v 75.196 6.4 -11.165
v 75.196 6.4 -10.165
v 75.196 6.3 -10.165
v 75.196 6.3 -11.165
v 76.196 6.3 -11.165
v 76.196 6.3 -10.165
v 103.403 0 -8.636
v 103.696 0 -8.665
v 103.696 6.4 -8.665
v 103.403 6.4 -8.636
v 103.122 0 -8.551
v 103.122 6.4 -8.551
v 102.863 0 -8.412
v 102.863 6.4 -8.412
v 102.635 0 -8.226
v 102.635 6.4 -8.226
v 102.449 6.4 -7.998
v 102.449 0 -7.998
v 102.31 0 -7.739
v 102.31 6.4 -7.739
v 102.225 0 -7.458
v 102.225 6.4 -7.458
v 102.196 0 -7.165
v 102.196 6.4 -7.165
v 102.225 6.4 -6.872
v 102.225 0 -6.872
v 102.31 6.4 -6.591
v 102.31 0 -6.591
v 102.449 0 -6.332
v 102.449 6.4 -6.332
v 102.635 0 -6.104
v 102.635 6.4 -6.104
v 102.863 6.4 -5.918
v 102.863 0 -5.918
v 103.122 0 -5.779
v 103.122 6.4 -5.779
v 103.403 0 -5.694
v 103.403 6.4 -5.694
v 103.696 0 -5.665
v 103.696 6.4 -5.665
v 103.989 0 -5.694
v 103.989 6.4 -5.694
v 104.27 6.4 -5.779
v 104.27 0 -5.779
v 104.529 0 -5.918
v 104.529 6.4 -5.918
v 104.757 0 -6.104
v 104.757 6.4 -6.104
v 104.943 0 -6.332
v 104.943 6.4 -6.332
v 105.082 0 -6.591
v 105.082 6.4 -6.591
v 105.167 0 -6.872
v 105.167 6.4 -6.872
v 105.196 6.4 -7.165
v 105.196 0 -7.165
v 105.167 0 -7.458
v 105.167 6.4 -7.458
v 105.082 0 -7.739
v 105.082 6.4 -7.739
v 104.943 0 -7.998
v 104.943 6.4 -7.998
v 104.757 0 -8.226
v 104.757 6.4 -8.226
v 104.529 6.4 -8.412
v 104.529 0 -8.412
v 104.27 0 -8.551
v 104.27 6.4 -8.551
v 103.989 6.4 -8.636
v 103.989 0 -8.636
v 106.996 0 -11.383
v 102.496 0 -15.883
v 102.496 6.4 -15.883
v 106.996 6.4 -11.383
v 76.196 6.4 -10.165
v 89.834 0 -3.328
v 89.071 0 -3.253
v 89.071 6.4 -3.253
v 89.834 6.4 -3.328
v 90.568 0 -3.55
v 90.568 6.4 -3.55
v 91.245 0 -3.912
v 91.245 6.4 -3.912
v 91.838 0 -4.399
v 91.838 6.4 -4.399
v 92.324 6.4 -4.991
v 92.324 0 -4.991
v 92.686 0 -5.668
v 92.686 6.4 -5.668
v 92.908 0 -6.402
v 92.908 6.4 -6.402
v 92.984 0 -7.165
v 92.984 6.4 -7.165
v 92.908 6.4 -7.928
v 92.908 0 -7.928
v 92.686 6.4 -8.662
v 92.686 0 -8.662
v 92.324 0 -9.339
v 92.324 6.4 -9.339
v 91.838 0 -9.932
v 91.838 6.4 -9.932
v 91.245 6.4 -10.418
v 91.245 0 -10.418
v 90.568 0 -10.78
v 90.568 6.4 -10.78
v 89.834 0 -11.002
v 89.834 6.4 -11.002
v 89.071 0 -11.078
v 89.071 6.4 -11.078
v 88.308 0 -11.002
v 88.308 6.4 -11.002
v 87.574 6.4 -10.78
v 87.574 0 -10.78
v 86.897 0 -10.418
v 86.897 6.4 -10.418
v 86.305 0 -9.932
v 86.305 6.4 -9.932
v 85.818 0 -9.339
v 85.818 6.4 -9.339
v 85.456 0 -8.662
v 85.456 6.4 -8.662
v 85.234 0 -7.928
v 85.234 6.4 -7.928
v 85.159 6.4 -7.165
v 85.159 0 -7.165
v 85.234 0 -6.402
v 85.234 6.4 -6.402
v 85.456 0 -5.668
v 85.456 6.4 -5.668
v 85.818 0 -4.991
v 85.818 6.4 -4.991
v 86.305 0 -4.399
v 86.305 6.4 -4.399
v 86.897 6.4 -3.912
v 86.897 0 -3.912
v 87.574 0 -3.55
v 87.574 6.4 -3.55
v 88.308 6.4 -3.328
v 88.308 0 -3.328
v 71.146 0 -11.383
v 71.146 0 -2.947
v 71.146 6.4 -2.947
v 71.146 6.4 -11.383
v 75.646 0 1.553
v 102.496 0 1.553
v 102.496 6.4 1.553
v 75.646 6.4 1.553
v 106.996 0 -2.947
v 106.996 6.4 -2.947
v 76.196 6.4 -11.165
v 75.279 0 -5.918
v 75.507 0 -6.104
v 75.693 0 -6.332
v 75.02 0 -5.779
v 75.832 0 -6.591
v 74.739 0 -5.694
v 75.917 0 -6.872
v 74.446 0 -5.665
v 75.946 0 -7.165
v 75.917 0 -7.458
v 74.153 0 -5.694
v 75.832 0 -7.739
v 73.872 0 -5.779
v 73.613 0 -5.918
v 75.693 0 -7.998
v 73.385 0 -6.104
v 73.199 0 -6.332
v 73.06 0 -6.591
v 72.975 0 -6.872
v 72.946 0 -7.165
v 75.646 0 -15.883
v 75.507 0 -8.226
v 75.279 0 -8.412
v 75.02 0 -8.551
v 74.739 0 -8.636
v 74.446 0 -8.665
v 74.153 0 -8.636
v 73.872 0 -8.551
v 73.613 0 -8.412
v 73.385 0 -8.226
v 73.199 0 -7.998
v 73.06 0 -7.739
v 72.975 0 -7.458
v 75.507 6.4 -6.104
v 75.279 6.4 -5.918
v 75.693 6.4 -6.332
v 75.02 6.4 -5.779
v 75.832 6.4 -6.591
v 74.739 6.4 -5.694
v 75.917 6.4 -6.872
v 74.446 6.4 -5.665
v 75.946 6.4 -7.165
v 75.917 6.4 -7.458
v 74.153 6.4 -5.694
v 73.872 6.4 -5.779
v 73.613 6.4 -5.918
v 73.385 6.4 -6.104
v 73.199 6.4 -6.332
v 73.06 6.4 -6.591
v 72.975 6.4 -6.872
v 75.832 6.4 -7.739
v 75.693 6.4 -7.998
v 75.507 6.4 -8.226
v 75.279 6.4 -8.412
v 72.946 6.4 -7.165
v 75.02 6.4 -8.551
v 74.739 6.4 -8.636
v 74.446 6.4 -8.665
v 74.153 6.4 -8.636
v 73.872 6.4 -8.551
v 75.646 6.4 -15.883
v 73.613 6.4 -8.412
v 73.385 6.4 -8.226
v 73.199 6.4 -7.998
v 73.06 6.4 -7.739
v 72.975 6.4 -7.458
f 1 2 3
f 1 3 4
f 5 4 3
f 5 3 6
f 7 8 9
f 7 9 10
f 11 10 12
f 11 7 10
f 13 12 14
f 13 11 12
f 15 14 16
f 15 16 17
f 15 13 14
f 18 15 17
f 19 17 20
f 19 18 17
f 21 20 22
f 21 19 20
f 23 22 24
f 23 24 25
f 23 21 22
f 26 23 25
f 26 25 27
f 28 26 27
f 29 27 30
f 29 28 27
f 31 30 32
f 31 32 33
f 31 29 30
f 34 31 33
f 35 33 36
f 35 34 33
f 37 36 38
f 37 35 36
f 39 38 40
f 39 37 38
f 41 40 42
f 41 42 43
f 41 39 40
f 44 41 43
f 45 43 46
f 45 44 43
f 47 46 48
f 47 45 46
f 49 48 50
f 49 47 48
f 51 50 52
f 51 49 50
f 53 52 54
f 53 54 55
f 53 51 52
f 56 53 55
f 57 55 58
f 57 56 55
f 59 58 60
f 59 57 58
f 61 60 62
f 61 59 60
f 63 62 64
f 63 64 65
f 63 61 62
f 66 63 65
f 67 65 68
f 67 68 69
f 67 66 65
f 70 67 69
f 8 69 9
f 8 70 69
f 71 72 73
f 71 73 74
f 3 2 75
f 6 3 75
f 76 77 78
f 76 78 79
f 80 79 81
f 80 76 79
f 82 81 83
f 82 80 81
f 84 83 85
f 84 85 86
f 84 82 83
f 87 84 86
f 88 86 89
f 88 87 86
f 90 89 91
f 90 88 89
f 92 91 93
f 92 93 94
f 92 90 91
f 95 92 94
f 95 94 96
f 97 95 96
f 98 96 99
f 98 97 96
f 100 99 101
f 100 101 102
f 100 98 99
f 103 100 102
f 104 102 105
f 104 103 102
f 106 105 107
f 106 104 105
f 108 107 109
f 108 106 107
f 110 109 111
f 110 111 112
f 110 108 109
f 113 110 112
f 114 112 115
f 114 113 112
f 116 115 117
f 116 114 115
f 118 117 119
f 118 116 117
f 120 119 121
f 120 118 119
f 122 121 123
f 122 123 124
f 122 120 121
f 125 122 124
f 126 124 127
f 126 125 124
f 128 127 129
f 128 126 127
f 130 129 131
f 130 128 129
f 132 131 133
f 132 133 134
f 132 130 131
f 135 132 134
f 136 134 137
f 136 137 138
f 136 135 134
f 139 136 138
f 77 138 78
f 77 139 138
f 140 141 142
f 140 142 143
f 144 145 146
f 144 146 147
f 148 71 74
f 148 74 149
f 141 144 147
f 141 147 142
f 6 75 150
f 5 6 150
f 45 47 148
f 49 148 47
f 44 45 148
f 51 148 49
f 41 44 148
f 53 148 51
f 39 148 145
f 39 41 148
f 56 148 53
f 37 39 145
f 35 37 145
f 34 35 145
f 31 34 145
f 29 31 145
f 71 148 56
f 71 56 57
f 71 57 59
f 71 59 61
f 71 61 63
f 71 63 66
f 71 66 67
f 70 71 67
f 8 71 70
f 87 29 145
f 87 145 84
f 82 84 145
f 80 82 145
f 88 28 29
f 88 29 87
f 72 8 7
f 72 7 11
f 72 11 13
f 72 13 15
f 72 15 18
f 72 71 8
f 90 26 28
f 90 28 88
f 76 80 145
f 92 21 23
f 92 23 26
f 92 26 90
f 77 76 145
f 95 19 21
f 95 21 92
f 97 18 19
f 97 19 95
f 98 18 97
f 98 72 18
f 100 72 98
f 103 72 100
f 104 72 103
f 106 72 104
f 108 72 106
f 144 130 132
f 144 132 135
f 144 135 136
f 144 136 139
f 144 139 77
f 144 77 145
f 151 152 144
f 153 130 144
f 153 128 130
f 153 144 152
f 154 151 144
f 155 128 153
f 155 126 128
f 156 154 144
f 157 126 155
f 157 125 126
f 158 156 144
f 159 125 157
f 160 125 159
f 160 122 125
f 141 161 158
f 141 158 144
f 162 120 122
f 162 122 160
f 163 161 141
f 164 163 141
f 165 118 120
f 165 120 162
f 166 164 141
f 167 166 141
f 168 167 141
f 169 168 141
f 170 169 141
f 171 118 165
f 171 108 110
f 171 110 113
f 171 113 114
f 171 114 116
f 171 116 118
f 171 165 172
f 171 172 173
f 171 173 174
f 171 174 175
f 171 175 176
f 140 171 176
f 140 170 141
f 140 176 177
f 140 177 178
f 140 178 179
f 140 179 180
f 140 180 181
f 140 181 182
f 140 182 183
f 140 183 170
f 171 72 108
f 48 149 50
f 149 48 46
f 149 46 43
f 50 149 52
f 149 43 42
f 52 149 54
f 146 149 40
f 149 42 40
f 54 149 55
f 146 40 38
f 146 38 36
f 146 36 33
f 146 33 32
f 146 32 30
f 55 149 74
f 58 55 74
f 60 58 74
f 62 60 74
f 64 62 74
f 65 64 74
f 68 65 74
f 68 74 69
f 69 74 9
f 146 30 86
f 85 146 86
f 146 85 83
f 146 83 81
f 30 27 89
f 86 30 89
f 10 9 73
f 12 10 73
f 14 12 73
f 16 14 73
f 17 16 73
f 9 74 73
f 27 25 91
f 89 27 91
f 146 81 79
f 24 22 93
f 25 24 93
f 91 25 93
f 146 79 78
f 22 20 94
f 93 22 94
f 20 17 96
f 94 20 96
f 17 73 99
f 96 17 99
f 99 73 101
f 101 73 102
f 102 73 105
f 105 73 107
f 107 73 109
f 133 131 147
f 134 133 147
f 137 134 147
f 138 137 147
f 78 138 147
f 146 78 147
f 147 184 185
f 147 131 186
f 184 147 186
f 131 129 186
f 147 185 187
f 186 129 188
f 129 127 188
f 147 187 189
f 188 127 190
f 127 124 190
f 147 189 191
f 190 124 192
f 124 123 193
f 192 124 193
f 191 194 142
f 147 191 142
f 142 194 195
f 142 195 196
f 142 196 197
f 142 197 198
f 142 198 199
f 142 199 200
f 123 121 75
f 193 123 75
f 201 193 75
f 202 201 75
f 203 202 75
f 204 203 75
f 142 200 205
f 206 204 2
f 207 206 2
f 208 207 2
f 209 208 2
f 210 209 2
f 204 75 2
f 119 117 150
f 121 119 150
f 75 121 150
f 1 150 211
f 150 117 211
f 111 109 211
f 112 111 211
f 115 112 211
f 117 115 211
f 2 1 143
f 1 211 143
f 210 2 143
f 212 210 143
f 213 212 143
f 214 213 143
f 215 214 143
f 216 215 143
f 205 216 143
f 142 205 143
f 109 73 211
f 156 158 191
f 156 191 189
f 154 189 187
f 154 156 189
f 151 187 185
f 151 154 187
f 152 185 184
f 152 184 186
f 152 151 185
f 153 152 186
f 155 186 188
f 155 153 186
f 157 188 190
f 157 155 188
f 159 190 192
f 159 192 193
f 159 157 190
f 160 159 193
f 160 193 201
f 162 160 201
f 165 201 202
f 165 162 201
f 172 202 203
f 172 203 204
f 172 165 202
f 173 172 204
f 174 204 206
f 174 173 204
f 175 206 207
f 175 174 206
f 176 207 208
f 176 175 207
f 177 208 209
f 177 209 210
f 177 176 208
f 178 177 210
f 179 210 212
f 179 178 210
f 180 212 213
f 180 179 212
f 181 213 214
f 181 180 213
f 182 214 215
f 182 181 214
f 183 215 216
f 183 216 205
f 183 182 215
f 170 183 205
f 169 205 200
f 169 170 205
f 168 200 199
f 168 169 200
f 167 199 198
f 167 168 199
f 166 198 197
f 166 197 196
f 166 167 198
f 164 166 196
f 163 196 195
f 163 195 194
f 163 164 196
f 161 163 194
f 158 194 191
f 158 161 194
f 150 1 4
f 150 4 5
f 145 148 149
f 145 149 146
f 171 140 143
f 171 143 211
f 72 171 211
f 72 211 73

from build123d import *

# Parameters (mm, degrees)
SKETCH1_R           = 3.9125
SKETCH1_R_2         = 1.5
BOSS_EXTRUDE1_DEPTH = 6.4
SKETCH2_W           = 1
SKETCH2_H           = 1
CUT_EXTRUDE1_DEPTH  = 0.1


with BuildPart() as part:
    # Sketch1 → Boss-Extrude1 (new body)
    with BuildSketch(Plane(origin=(0, 0, 0), x_dir=(1, 0, 0), z_dir=(0, 1, 0))):
        Polygon((102.49610132, 15.883489834), (106.99610132, 11.383489834), (106.99610132, 2.946691354), (102.49610132, -1.553308646), (75.64610132, -1.553308646), (71.14610132, 2.946691354), (71.14610132, 11.383489834), (75.64610132, 15.883489834), align=None)
        with Locations(Location((89.07110132, 7.165090594, 0), (0, 0, 270))):
            Circle(SKETCH1_R, mode=Mode.SUBTRACT)
        with Locations(Location((74.44610132, 7.165090594, 0), (0, 0, 270))):
            Circle(SKETCH1_R_2, mode=Mode.SUBTRACT)
        with Locations(Location((103.69610132, 7.165090594, 0), (0, 0, 90))):
            Circle(SKETCH1_R_2, mode=Mode.SUBTRACT)
    extrude(amount=BOSS_EXTRUDE1_DEPTH)

    # Sketch2 → Cut-Extrude1 (cut)
    with BuildSketch(Plane(origin=(0, 6.4, 0), x_dir=(1, 0, 0), z_dir=(0, 1, 0))):
        with Locations((75.696023721, 10.665090594)):
            Rectangle(SKETCH2_W, SKETCH2_H)
    extrude(amount=-CUT_EXTRUDE1_DEPTH, mode=Mode.SUBTRACT)


solid = part.part
